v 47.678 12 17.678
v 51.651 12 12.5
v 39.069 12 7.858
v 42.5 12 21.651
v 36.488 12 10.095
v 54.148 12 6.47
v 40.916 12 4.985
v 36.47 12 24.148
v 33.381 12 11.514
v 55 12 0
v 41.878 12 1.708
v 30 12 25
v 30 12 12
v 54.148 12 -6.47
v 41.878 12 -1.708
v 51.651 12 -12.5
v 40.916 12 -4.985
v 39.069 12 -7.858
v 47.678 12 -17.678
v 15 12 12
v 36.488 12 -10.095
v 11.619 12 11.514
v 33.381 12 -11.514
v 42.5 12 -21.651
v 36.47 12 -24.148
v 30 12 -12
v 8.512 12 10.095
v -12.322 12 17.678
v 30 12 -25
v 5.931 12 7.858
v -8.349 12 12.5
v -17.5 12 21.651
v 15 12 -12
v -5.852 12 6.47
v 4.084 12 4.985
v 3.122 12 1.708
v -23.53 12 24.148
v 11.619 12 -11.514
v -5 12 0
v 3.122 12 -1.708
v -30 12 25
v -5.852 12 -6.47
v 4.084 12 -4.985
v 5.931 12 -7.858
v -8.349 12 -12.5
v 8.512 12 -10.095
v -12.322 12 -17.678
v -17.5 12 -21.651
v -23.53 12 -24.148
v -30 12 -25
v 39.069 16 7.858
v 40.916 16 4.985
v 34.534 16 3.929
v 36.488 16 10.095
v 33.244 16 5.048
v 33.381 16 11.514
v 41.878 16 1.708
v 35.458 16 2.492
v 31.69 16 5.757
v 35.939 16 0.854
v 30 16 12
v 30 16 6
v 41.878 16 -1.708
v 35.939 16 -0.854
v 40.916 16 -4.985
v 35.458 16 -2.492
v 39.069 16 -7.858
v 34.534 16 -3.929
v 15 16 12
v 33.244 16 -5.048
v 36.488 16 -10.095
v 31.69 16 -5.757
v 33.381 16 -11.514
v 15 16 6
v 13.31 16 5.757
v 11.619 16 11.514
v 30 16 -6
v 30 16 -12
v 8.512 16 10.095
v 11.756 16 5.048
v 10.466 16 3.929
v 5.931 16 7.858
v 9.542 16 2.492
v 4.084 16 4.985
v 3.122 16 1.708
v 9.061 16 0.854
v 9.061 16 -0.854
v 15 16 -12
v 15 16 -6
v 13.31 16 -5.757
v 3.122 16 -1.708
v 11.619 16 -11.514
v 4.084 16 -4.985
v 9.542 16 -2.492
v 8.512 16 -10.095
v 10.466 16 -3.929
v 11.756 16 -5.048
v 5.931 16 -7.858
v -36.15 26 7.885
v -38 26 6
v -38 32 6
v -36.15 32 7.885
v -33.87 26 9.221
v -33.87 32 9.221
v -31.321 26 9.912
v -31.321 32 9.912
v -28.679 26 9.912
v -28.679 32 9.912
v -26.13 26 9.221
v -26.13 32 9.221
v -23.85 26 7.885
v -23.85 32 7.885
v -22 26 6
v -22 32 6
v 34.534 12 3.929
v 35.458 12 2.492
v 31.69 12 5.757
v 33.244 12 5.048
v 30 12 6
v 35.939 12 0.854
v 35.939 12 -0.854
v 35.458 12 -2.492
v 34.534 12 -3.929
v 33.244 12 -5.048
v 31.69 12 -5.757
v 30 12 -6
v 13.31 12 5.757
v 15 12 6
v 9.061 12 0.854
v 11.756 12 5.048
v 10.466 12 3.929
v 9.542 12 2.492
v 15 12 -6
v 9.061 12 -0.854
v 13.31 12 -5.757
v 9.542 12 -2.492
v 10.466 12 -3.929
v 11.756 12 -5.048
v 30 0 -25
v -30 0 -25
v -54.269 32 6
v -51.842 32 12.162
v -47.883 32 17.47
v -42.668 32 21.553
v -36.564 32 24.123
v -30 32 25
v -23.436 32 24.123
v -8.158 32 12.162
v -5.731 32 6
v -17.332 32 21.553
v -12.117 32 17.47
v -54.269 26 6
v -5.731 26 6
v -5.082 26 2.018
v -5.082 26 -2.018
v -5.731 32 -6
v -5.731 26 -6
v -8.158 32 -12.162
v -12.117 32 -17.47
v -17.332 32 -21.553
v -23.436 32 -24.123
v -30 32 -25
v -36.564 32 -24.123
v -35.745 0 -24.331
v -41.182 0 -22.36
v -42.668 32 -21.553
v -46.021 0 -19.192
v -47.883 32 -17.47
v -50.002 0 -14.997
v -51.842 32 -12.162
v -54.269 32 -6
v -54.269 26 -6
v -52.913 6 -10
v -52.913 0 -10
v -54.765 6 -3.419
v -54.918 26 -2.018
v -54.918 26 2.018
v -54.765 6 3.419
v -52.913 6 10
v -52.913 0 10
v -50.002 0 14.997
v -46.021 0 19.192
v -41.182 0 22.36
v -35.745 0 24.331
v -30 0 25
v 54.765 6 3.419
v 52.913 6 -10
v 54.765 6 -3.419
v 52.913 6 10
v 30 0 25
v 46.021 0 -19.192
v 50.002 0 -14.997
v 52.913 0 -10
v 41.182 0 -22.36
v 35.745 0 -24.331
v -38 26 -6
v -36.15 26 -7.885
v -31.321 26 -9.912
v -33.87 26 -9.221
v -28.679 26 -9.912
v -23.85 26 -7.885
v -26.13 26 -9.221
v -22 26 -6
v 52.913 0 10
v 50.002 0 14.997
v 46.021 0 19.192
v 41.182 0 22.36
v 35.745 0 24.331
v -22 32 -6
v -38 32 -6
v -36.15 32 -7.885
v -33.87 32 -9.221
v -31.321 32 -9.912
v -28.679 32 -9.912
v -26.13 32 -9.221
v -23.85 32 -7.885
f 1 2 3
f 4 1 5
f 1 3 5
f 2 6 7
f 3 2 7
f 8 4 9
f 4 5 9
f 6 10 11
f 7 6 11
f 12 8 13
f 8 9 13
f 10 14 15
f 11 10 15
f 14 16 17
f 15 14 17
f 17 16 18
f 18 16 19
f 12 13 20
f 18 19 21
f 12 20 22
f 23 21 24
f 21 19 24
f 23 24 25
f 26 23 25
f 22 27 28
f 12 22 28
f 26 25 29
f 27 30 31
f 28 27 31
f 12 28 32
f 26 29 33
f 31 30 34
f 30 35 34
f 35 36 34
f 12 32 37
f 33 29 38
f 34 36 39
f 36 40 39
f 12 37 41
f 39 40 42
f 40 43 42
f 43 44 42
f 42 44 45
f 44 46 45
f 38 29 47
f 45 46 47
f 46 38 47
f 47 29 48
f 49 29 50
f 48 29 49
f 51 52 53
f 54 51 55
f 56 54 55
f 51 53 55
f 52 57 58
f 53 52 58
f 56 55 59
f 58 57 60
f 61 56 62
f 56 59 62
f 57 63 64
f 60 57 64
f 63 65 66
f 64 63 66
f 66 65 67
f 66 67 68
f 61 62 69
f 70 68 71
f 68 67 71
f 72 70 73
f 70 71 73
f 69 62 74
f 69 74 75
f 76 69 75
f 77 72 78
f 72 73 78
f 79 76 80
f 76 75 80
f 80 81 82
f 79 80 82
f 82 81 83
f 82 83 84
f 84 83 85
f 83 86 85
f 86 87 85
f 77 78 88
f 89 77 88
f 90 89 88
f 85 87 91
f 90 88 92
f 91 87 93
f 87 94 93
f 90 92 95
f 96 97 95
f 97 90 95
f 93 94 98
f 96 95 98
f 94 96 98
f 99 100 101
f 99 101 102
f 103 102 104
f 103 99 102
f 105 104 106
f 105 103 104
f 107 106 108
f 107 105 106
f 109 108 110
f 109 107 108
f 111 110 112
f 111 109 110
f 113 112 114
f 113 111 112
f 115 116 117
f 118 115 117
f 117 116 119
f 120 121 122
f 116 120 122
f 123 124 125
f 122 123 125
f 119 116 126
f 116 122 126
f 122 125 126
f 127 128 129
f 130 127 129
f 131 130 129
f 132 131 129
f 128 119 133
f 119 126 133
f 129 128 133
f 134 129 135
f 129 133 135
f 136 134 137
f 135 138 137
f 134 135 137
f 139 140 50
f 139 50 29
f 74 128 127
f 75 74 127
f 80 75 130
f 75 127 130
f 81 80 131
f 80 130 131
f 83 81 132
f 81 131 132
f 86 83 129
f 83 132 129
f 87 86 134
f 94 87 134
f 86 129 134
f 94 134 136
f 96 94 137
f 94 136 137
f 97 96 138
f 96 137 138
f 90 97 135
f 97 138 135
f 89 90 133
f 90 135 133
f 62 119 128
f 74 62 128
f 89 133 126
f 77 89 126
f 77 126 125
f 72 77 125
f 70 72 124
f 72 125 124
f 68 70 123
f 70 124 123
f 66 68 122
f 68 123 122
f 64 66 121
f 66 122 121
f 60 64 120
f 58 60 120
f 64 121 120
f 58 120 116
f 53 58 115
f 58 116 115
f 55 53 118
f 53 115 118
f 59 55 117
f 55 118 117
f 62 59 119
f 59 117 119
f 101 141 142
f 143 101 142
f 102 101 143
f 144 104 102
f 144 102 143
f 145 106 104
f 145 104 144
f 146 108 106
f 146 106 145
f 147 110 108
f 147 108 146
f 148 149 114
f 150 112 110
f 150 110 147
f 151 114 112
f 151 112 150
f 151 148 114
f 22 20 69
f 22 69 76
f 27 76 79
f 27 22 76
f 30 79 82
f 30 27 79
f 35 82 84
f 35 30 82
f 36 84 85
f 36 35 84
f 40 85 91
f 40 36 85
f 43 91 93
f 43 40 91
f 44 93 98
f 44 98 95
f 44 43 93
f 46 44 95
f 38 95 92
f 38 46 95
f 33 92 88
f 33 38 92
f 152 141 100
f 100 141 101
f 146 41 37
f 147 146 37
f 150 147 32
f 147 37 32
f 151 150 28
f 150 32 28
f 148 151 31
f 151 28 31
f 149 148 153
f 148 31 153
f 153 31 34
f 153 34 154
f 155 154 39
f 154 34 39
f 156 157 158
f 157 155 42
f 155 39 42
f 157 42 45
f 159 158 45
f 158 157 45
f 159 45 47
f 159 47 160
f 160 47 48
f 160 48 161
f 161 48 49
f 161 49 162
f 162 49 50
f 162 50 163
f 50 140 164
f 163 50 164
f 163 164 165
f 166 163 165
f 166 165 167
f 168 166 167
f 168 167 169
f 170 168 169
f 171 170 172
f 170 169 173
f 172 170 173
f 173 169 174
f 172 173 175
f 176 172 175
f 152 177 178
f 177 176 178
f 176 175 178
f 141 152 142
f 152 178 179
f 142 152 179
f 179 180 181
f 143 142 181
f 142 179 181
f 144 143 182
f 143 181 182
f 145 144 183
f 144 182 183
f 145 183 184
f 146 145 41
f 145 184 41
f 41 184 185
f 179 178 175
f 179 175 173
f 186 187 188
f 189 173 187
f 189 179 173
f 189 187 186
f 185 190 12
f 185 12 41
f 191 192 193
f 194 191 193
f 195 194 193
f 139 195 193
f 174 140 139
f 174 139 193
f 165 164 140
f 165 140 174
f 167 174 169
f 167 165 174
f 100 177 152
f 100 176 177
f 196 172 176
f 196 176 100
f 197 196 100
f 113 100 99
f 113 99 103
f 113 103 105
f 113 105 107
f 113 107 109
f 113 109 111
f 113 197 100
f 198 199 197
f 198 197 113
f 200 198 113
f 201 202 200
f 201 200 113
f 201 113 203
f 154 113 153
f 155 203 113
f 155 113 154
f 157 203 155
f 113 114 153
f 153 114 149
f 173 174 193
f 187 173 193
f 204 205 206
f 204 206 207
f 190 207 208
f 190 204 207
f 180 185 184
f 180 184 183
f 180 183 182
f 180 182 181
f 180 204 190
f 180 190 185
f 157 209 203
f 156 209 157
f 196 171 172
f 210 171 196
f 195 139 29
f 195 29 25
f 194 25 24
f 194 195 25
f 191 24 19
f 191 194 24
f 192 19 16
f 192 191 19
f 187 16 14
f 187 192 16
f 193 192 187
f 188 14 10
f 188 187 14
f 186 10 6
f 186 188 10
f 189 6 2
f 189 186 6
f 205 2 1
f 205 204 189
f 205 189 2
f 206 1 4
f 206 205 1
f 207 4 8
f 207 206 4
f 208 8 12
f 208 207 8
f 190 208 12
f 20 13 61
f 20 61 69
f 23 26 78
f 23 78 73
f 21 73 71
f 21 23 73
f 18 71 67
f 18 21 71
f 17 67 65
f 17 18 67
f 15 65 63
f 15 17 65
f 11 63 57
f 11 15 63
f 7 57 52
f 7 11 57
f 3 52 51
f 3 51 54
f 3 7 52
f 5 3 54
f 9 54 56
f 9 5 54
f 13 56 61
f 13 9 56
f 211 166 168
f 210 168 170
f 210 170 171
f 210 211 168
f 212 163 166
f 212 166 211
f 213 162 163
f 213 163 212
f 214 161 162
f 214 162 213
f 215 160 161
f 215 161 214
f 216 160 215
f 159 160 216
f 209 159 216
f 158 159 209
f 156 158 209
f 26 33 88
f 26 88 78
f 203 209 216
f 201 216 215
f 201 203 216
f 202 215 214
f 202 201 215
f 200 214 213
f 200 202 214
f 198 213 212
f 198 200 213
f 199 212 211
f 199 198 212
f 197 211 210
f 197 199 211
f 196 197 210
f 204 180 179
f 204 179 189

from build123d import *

# Parameters (mm, degrees)
BOSS_EXTRUDE1_DEPTH = 12
SKETCH2_R           = 25
BOSS_EXTRUDE2_DEPTH = 20
BOSS_EXTRUDE3_DEPTH = 4
SKETCH4_W           = 55
SKETCH4_H           = 12
CUT_EXTRUDE1_DEPTH  = 6
SKETCH5_R           = 10
CUT_EXTRUDE2_DEPTH  = 17
SKETCH6_W           = 125
SKETCH6_H           = 20
CUT_EXTRUDE3_DEPTH  = 6


with BuildPart() as part:
    # Sketch1 → Boss-Extrude1 (new body)
    with BuildSketch(Plane(origin=(0, 0, 0), x_dir=(1, 0, 0), z_dir=(0, 1, 0))):
        with BuildLine():
            Line((-30, 25), (30, 25))
            ThreePointArc((30, 25), (55, 0), (30, -25))
            Line((30, -25), (-30, -25))
            ThreePointArc((-30, -25), (-55, 0), (-30, 25))
        make_face()
    extrude(amount=BOSS_EXTRUDE1_DEPTH)

    # Sketch2 → Boss-Extrude2 (add)
    with BuildSketch(Plane(origin=(0, 12, 0), x_dir=(1, 0, 0), z_dir=(0, 1, 0))):
        with Locations(Location((-30, 0, 0), (0, 0, 270))):
            Circle(SKETCH2_R)
    extrude(amount=BOSS_EXTRUDE2_DEPTH)

    # Sketch3 → Boss-Extrude3 (add)
    with BuildSketch(Plane(origin=(0, 12, 0), x_dir=(1, 0, 0), z_dir=(0, 1, 0))):
        with BuildLine():
            Line((30, -12), (15, -12))
            ThreePointArc((15, -12), (3, 0), (15, 12))
            Line((15, 12), (30, 12))
            ThreePointArc((30, 12), (42, 0), (30, -12))
        make_face()
        with BuildLine():
            Line((30, -6), (15, -6))
            ThreePointArc((15, -6), (9, 0), (15, 6))
            Line((15, 6), (30, 6))
            ThreePointArc((30, 6), (36, 0), (30, -6))
        make_face(mode=Mode.SUBTRACT)
    extrude(amount=BOSS_EXTRUDE3_DEPTH)

    # Sketch4 → Cut-Extrude1 (cut)
    with BuildSketch(Plane(origin=(0, 32, 0), x_dir=(1, 0, 0), z_dir=(0, 1, 0))):
        with Locations((-30, 0)):
            Rectangle(SKETCH4_W, SKETCH4_H)
    extrude(amount=-CUT_EXTRUDE1_DEPTH, mode=Mode.SUBTRACT)

    # Sketch5 → Cut-Extrude2 (cut)
    with BuildSketch(Plane(origin=(0, 26, 0), x_dir=(1, 0, 0), z_dir=(0, 1, 0))):
        with Locations((-30, 0)):
            Circle(SKETCH5_R)
    extrude(amount=CUT_EXTRUDE2_DEPTH, mode=Mode.SUBTRACT)

    # Sketch6 → Cut-Extrude3 (cut)
    with BuildSketch(Plane.XZ):
        Rectangle(SKETCH6_W, SKETCH6_H)
    extrude(amount=-CUT_EXTRUDE3_DEPTH, mode=Mode.SUBTRACT)


solid = part.part
